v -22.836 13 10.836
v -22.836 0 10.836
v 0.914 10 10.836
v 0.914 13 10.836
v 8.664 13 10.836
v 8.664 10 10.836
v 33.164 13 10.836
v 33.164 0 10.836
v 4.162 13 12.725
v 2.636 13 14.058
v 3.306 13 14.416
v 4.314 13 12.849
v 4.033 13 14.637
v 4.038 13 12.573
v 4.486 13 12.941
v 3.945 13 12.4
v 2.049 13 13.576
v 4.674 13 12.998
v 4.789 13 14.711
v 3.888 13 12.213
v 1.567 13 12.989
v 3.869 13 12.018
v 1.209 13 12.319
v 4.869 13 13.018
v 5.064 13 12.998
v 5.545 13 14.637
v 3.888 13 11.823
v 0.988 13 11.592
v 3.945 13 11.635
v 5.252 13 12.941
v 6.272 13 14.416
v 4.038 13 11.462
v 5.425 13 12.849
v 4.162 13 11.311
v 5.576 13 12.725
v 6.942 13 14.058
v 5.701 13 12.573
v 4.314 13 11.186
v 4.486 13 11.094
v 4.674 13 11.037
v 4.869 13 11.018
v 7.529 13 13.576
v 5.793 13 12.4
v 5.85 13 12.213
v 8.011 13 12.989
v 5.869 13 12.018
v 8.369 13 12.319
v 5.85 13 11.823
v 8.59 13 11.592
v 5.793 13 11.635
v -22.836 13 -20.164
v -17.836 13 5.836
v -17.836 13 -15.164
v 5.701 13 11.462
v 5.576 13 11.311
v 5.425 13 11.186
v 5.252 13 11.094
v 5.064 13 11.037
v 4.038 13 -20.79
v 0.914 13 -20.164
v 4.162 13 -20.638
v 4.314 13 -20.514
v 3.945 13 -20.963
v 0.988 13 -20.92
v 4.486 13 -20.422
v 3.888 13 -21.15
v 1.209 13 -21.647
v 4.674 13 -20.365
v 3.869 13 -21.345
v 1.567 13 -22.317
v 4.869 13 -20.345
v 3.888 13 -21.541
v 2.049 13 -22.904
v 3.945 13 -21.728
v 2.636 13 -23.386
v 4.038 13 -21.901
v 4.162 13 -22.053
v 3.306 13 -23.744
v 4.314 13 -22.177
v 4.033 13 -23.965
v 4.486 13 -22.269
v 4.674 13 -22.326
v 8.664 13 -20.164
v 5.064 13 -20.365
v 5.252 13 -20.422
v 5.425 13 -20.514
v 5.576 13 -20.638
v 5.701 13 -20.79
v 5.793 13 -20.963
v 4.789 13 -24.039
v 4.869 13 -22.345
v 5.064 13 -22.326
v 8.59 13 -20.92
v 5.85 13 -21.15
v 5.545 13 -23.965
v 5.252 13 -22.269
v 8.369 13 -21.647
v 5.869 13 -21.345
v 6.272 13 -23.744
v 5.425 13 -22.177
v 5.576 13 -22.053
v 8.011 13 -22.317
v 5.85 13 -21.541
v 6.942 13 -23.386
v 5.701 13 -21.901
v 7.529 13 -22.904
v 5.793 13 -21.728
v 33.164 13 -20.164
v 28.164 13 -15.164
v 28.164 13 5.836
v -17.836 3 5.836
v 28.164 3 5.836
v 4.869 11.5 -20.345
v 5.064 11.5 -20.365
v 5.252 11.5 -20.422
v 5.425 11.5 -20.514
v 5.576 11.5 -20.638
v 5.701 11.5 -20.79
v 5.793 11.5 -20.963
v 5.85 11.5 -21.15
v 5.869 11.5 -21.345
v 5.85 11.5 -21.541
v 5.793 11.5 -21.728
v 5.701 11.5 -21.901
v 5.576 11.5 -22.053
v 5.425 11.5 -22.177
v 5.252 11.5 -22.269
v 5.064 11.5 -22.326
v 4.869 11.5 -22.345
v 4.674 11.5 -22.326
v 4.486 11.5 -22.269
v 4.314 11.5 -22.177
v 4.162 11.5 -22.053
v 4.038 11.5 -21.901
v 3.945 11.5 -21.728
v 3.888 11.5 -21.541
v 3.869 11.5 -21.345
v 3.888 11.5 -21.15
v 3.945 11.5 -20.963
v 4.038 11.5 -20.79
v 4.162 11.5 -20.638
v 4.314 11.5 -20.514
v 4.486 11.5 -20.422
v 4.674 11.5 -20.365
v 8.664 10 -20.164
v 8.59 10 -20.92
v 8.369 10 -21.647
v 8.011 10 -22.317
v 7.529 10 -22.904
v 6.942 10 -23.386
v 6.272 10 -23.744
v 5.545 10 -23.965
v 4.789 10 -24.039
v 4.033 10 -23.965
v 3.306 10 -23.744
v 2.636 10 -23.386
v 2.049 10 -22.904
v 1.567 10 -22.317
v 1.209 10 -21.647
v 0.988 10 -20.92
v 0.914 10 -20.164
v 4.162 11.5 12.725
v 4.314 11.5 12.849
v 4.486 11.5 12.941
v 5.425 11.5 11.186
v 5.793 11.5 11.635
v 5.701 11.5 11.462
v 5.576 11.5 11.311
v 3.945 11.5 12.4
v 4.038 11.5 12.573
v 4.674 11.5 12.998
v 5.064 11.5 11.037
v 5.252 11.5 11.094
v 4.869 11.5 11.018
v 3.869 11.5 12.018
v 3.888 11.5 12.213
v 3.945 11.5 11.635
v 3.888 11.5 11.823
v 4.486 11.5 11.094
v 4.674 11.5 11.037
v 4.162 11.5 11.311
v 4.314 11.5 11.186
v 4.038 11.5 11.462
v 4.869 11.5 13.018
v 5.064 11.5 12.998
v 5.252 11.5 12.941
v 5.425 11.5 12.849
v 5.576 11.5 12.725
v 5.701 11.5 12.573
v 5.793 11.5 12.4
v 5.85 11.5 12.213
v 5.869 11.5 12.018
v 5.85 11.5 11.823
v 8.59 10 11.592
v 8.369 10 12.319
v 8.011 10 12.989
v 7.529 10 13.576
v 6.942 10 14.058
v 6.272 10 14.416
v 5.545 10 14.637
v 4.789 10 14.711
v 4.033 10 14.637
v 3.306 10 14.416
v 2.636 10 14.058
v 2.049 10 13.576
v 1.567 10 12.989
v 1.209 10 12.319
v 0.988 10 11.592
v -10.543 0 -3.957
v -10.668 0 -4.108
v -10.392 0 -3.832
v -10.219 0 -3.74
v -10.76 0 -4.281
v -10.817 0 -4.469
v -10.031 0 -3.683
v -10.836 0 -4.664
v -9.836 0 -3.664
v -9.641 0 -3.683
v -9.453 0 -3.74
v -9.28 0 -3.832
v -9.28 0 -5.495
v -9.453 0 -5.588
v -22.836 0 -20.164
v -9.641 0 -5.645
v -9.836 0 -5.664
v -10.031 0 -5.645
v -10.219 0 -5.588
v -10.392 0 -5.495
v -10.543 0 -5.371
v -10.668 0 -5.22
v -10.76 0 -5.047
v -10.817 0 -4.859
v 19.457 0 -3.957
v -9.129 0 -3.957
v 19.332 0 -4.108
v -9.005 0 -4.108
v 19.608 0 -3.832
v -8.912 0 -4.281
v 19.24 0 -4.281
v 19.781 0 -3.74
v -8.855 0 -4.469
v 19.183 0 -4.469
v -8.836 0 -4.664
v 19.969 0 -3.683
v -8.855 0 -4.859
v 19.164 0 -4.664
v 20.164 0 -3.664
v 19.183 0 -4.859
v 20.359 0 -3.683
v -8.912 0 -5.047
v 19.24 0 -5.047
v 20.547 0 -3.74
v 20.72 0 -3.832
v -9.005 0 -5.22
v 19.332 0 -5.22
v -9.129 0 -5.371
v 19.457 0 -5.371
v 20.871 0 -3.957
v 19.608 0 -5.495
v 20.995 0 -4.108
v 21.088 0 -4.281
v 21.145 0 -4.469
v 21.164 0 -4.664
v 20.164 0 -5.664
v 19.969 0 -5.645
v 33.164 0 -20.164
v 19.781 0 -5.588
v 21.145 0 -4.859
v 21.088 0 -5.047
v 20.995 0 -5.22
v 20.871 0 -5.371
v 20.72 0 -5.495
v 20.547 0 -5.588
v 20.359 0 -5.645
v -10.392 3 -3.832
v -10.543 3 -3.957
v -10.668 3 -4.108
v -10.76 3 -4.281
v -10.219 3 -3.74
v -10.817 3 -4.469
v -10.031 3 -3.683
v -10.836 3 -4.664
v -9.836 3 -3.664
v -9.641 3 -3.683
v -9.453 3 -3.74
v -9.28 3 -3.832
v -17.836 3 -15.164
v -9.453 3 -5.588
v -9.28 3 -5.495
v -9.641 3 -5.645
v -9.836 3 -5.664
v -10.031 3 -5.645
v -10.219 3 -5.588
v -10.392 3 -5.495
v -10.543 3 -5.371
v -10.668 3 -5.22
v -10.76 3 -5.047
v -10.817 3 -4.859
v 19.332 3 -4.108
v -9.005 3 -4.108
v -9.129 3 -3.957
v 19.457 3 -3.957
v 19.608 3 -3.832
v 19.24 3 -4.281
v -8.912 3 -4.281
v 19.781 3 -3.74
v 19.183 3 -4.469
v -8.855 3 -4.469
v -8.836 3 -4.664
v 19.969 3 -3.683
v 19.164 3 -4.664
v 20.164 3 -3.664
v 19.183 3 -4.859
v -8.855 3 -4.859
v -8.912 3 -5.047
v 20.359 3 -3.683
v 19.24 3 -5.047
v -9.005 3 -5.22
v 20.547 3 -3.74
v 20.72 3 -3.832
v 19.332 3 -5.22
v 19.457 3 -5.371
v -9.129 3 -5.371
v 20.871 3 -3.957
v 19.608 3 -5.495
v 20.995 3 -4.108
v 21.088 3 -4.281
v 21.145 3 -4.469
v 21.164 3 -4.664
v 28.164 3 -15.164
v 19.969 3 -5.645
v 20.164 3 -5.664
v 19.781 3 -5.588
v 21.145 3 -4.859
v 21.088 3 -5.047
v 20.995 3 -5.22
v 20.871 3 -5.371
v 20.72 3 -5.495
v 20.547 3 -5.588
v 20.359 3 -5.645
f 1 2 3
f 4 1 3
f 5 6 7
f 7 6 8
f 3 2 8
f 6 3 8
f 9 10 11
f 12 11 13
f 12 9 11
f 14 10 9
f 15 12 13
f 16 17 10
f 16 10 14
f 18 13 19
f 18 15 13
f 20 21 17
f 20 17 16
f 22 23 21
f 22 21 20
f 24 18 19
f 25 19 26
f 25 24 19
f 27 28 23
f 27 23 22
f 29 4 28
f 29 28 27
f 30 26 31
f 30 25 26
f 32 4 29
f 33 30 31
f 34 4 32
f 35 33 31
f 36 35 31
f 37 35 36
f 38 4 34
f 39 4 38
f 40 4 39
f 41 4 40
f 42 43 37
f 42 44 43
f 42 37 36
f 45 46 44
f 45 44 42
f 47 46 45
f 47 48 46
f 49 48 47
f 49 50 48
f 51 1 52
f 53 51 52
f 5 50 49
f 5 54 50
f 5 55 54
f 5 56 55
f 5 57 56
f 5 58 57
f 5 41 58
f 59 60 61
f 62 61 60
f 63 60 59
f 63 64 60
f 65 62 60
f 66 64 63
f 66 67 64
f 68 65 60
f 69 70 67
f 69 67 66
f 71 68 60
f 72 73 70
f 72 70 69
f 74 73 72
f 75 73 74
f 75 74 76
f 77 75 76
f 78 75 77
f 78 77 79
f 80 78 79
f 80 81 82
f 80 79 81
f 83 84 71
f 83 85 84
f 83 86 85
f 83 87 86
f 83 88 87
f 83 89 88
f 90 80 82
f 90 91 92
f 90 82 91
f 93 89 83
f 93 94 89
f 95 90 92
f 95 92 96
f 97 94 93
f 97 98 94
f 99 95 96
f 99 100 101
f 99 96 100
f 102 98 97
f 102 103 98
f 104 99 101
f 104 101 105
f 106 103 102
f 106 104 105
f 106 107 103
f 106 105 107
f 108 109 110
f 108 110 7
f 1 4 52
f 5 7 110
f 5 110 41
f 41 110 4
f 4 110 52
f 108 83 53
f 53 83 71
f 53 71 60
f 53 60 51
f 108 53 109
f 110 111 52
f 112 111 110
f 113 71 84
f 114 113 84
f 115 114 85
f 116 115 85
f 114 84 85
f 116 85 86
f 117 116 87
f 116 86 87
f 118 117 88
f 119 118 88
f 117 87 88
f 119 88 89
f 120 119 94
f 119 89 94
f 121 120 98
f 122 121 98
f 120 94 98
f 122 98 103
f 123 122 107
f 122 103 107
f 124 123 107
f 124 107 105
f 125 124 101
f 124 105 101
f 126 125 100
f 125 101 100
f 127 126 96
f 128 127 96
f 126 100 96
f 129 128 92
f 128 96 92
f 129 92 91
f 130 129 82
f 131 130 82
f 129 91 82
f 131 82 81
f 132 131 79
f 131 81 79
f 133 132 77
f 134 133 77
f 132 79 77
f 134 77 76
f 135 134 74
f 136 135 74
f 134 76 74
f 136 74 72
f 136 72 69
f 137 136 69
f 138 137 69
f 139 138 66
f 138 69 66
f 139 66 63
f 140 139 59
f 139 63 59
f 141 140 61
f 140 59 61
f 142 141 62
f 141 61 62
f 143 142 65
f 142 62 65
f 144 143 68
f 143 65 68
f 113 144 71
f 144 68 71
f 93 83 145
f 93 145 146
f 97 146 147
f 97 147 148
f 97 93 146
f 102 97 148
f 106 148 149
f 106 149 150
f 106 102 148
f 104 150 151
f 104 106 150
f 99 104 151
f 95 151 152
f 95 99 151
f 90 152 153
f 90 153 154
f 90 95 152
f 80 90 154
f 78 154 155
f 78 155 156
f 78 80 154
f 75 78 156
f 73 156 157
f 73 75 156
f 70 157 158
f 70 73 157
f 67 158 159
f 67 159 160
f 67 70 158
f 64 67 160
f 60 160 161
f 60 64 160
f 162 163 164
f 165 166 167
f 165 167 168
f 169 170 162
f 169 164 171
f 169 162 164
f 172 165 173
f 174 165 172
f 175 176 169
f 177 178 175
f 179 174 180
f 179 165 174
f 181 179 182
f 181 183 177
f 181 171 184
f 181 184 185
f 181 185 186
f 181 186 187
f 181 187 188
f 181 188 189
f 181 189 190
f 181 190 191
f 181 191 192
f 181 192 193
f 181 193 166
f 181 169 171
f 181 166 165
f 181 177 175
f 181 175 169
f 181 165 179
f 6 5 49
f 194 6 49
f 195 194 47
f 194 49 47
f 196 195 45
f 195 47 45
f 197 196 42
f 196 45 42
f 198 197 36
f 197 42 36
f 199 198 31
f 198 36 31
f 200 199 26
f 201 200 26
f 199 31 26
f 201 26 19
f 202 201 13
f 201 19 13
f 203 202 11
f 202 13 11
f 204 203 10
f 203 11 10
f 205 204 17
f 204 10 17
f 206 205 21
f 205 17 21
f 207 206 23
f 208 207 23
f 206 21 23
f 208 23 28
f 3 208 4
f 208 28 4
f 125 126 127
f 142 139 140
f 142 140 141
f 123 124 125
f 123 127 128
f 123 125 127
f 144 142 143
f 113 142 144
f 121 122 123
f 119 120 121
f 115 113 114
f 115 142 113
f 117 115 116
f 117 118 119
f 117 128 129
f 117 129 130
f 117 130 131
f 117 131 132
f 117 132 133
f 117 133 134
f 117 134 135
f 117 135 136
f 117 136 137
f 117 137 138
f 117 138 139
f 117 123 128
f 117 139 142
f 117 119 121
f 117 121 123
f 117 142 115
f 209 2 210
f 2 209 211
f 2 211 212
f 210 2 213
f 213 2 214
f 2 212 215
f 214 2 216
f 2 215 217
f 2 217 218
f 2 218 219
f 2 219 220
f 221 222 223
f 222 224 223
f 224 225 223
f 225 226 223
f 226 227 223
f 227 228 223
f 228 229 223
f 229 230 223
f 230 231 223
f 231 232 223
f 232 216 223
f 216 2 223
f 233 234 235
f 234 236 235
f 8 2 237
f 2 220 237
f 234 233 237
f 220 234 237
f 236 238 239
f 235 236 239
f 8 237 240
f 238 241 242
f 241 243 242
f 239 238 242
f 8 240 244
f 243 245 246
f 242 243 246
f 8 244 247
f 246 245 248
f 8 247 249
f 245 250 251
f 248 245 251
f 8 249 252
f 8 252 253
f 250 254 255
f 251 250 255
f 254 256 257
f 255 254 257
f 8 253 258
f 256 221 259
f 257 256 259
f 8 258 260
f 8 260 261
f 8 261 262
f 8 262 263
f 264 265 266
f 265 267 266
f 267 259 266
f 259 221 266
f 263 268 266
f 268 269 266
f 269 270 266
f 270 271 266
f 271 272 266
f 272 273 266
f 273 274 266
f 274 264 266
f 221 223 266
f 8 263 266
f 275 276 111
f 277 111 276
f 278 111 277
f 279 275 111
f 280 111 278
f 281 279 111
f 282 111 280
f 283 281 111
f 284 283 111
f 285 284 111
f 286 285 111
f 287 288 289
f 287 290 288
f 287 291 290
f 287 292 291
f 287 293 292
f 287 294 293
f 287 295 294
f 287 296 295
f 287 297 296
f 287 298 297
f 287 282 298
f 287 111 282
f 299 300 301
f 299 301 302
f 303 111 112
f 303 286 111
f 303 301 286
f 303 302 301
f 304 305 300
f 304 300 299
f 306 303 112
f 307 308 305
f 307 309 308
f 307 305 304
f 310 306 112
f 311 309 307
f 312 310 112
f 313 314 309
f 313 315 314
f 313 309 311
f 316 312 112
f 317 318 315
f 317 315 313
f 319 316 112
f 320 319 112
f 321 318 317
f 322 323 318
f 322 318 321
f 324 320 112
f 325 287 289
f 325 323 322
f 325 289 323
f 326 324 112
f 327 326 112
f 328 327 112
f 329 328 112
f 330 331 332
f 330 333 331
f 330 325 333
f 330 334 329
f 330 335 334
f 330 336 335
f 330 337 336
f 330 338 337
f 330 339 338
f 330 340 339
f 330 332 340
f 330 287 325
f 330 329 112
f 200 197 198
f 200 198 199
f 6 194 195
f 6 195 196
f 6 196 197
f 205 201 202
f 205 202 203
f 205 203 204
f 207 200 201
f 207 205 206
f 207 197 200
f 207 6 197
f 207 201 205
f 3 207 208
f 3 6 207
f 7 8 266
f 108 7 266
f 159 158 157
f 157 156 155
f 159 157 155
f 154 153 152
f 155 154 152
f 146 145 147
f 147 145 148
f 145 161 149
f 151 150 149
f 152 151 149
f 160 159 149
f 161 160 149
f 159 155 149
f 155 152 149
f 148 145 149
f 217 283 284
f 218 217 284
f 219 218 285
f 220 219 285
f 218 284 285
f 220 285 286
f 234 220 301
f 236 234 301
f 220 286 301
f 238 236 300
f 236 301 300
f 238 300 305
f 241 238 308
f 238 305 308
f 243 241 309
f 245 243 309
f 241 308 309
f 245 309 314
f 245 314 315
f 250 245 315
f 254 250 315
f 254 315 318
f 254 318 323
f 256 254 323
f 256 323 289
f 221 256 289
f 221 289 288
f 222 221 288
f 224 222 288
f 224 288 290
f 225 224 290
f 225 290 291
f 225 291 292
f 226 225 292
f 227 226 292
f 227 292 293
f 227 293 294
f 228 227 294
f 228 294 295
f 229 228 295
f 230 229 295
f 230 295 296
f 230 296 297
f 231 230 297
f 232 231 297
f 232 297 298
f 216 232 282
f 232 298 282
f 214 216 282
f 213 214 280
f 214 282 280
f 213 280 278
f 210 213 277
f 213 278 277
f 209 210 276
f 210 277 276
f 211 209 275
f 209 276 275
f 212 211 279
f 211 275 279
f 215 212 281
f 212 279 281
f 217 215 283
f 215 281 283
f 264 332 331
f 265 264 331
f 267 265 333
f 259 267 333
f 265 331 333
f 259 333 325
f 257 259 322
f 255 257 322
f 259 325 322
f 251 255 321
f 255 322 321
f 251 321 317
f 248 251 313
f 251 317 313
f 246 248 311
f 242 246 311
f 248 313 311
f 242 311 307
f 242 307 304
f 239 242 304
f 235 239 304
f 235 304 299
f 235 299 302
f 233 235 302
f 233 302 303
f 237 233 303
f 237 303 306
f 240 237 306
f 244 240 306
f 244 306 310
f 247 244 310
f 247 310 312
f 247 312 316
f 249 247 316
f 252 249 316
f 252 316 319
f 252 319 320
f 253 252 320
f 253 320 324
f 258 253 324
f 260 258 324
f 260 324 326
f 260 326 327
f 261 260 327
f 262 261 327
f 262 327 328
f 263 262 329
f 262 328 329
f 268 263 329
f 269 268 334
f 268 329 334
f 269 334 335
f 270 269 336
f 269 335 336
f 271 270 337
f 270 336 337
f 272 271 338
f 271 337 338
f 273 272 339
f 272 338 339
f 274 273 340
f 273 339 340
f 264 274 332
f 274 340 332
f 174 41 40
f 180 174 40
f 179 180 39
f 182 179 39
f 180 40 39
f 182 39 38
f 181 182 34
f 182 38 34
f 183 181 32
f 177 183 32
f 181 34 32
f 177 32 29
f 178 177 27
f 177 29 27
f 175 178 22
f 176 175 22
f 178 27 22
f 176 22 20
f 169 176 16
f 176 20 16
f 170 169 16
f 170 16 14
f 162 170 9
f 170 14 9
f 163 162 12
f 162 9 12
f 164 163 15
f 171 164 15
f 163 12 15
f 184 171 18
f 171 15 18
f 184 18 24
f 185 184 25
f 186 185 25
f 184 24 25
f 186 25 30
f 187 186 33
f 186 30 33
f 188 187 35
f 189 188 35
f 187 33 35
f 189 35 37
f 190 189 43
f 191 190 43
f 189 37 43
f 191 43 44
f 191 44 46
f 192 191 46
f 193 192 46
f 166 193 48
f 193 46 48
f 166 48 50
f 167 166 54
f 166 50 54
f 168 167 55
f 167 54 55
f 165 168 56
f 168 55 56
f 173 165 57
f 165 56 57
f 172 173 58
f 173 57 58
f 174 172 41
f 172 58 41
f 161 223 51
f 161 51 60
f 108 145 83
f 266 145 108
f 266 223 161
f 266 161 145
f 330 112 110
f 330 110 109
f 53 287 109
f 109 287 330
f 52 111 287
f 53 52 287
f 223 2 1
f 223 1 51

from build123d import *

# Parameters (mm, degrees)
SKETCH1_W           = 46
SKETCH1_H           = 21
BOSS_EXTRUDE4_DEPTH = 3
SKETCH1_5_W         = 56
SKETCH1_5_H         = 31
SKETCH1_5_W_2       = 46
SKETCH1_5_H_2       = 21
BOSS_EXTRUDE5_DEPTH = 13
BOSS_EXTRUDE6_DEPTH = 3
SKETCH5_R           = 1
CUT_EXTRUDE1_DEPTH  = 1.5
SKETCH6_R           = 1
CUT_EXTRUDE2_DEPTH  = 5


with BuildPart() as part:
    # Sketch1 → Boss-Extrude4 (new body)
    with BuildSketch(Plane(origin=(0, 0, 0), x_dir=(1, 0, 0), z_dir=(0, 1, 0))):
        with Locations((5.163934426, 4.663934426)):
            Rectangle(SKETCH1_W, SKETCH1_H)
    extrude(amount=BOSS_EXTRUDE4_DEPTH)

    # Sketch1<5> → Boss-Extrude5 (add)
    with BuildSketch(Plane(origin=(0, 0, 0), x_dir=(1, 0, 0), z_dir=(0, 1, 0))):
        with Locations((5.163934426, 4.663934426)):
            Rectangle(SKETCH1_5_W, SKETCH1_5_H)
        with Locations((5.163934426, 4.663934426)):
            Rectangle(SKETCH1_5_W_2, SKETCH1_5_H_2, mode=Mode.SUBTRACT)
    extrude(amount=BOSS_EXTRUDE5_DEPTH)

    # Sketch4 → Boss-Extrude6 (add)
    with BuildSketch(Plane(origin=(0, 13, 0), x_dir=(1, 0, 0), z_dir=(0, 1, 0))):
        with BuildLine():
            Line((0.913554246, 20.163934426), (8.664247516, 20.163934426))
            ThreePointArc((8.664247516, 20.163934426), (4.788900881, 24.039281061), (0.913554246, 20.163934426))
        make_face()
        with BuildLine():
            Line((0.913554246, -10.836065574), (8.664247516, -10.836065574))
            ThreePointArc((8.664247516, -10.836065574), (4.788900881, -14.711412209), (0.913554246, -10.836065574))
        make_face()
    extrude(amount=-BOSS_EXTRUDE6_DEPTH)

    # Sketch5 → Cut-Extrude1 (cut)
    with BuildSketch(Plane(origin=(0, 13, 0), x_dir=(1, 0, 0), z_dir=(0, 1, 0))):
        with Locations((4.869123842, 21.345488129)):
            Circle(SKETCH5_R)
        with Locations((4.869123842, -12.017619277)):
            Circle(SKETCH5_R)
    extrude(amount=-CUT_EXTRUDE1_DEPTH, mode=Mode.SUBTRACT)

    # Sketch6 → Cut-Extrude2 (cut)
    with BuildSketch(Plane(origin=(0, 3, 0), x_dir=(1, 0, 0), z_dir=(0, 1, 0))):
        with Locations((-9.836065574, 4.663934426)):
            Circle(SKETCH6_R)
        with Locations((20.163934426, 4.663934426)):
            Circle(SKETCH6_R)
    extrude(amount=-CUT_EXTRUDE2_DEPTH, mode=Mode.SUBTRACT)


solid = part.part
